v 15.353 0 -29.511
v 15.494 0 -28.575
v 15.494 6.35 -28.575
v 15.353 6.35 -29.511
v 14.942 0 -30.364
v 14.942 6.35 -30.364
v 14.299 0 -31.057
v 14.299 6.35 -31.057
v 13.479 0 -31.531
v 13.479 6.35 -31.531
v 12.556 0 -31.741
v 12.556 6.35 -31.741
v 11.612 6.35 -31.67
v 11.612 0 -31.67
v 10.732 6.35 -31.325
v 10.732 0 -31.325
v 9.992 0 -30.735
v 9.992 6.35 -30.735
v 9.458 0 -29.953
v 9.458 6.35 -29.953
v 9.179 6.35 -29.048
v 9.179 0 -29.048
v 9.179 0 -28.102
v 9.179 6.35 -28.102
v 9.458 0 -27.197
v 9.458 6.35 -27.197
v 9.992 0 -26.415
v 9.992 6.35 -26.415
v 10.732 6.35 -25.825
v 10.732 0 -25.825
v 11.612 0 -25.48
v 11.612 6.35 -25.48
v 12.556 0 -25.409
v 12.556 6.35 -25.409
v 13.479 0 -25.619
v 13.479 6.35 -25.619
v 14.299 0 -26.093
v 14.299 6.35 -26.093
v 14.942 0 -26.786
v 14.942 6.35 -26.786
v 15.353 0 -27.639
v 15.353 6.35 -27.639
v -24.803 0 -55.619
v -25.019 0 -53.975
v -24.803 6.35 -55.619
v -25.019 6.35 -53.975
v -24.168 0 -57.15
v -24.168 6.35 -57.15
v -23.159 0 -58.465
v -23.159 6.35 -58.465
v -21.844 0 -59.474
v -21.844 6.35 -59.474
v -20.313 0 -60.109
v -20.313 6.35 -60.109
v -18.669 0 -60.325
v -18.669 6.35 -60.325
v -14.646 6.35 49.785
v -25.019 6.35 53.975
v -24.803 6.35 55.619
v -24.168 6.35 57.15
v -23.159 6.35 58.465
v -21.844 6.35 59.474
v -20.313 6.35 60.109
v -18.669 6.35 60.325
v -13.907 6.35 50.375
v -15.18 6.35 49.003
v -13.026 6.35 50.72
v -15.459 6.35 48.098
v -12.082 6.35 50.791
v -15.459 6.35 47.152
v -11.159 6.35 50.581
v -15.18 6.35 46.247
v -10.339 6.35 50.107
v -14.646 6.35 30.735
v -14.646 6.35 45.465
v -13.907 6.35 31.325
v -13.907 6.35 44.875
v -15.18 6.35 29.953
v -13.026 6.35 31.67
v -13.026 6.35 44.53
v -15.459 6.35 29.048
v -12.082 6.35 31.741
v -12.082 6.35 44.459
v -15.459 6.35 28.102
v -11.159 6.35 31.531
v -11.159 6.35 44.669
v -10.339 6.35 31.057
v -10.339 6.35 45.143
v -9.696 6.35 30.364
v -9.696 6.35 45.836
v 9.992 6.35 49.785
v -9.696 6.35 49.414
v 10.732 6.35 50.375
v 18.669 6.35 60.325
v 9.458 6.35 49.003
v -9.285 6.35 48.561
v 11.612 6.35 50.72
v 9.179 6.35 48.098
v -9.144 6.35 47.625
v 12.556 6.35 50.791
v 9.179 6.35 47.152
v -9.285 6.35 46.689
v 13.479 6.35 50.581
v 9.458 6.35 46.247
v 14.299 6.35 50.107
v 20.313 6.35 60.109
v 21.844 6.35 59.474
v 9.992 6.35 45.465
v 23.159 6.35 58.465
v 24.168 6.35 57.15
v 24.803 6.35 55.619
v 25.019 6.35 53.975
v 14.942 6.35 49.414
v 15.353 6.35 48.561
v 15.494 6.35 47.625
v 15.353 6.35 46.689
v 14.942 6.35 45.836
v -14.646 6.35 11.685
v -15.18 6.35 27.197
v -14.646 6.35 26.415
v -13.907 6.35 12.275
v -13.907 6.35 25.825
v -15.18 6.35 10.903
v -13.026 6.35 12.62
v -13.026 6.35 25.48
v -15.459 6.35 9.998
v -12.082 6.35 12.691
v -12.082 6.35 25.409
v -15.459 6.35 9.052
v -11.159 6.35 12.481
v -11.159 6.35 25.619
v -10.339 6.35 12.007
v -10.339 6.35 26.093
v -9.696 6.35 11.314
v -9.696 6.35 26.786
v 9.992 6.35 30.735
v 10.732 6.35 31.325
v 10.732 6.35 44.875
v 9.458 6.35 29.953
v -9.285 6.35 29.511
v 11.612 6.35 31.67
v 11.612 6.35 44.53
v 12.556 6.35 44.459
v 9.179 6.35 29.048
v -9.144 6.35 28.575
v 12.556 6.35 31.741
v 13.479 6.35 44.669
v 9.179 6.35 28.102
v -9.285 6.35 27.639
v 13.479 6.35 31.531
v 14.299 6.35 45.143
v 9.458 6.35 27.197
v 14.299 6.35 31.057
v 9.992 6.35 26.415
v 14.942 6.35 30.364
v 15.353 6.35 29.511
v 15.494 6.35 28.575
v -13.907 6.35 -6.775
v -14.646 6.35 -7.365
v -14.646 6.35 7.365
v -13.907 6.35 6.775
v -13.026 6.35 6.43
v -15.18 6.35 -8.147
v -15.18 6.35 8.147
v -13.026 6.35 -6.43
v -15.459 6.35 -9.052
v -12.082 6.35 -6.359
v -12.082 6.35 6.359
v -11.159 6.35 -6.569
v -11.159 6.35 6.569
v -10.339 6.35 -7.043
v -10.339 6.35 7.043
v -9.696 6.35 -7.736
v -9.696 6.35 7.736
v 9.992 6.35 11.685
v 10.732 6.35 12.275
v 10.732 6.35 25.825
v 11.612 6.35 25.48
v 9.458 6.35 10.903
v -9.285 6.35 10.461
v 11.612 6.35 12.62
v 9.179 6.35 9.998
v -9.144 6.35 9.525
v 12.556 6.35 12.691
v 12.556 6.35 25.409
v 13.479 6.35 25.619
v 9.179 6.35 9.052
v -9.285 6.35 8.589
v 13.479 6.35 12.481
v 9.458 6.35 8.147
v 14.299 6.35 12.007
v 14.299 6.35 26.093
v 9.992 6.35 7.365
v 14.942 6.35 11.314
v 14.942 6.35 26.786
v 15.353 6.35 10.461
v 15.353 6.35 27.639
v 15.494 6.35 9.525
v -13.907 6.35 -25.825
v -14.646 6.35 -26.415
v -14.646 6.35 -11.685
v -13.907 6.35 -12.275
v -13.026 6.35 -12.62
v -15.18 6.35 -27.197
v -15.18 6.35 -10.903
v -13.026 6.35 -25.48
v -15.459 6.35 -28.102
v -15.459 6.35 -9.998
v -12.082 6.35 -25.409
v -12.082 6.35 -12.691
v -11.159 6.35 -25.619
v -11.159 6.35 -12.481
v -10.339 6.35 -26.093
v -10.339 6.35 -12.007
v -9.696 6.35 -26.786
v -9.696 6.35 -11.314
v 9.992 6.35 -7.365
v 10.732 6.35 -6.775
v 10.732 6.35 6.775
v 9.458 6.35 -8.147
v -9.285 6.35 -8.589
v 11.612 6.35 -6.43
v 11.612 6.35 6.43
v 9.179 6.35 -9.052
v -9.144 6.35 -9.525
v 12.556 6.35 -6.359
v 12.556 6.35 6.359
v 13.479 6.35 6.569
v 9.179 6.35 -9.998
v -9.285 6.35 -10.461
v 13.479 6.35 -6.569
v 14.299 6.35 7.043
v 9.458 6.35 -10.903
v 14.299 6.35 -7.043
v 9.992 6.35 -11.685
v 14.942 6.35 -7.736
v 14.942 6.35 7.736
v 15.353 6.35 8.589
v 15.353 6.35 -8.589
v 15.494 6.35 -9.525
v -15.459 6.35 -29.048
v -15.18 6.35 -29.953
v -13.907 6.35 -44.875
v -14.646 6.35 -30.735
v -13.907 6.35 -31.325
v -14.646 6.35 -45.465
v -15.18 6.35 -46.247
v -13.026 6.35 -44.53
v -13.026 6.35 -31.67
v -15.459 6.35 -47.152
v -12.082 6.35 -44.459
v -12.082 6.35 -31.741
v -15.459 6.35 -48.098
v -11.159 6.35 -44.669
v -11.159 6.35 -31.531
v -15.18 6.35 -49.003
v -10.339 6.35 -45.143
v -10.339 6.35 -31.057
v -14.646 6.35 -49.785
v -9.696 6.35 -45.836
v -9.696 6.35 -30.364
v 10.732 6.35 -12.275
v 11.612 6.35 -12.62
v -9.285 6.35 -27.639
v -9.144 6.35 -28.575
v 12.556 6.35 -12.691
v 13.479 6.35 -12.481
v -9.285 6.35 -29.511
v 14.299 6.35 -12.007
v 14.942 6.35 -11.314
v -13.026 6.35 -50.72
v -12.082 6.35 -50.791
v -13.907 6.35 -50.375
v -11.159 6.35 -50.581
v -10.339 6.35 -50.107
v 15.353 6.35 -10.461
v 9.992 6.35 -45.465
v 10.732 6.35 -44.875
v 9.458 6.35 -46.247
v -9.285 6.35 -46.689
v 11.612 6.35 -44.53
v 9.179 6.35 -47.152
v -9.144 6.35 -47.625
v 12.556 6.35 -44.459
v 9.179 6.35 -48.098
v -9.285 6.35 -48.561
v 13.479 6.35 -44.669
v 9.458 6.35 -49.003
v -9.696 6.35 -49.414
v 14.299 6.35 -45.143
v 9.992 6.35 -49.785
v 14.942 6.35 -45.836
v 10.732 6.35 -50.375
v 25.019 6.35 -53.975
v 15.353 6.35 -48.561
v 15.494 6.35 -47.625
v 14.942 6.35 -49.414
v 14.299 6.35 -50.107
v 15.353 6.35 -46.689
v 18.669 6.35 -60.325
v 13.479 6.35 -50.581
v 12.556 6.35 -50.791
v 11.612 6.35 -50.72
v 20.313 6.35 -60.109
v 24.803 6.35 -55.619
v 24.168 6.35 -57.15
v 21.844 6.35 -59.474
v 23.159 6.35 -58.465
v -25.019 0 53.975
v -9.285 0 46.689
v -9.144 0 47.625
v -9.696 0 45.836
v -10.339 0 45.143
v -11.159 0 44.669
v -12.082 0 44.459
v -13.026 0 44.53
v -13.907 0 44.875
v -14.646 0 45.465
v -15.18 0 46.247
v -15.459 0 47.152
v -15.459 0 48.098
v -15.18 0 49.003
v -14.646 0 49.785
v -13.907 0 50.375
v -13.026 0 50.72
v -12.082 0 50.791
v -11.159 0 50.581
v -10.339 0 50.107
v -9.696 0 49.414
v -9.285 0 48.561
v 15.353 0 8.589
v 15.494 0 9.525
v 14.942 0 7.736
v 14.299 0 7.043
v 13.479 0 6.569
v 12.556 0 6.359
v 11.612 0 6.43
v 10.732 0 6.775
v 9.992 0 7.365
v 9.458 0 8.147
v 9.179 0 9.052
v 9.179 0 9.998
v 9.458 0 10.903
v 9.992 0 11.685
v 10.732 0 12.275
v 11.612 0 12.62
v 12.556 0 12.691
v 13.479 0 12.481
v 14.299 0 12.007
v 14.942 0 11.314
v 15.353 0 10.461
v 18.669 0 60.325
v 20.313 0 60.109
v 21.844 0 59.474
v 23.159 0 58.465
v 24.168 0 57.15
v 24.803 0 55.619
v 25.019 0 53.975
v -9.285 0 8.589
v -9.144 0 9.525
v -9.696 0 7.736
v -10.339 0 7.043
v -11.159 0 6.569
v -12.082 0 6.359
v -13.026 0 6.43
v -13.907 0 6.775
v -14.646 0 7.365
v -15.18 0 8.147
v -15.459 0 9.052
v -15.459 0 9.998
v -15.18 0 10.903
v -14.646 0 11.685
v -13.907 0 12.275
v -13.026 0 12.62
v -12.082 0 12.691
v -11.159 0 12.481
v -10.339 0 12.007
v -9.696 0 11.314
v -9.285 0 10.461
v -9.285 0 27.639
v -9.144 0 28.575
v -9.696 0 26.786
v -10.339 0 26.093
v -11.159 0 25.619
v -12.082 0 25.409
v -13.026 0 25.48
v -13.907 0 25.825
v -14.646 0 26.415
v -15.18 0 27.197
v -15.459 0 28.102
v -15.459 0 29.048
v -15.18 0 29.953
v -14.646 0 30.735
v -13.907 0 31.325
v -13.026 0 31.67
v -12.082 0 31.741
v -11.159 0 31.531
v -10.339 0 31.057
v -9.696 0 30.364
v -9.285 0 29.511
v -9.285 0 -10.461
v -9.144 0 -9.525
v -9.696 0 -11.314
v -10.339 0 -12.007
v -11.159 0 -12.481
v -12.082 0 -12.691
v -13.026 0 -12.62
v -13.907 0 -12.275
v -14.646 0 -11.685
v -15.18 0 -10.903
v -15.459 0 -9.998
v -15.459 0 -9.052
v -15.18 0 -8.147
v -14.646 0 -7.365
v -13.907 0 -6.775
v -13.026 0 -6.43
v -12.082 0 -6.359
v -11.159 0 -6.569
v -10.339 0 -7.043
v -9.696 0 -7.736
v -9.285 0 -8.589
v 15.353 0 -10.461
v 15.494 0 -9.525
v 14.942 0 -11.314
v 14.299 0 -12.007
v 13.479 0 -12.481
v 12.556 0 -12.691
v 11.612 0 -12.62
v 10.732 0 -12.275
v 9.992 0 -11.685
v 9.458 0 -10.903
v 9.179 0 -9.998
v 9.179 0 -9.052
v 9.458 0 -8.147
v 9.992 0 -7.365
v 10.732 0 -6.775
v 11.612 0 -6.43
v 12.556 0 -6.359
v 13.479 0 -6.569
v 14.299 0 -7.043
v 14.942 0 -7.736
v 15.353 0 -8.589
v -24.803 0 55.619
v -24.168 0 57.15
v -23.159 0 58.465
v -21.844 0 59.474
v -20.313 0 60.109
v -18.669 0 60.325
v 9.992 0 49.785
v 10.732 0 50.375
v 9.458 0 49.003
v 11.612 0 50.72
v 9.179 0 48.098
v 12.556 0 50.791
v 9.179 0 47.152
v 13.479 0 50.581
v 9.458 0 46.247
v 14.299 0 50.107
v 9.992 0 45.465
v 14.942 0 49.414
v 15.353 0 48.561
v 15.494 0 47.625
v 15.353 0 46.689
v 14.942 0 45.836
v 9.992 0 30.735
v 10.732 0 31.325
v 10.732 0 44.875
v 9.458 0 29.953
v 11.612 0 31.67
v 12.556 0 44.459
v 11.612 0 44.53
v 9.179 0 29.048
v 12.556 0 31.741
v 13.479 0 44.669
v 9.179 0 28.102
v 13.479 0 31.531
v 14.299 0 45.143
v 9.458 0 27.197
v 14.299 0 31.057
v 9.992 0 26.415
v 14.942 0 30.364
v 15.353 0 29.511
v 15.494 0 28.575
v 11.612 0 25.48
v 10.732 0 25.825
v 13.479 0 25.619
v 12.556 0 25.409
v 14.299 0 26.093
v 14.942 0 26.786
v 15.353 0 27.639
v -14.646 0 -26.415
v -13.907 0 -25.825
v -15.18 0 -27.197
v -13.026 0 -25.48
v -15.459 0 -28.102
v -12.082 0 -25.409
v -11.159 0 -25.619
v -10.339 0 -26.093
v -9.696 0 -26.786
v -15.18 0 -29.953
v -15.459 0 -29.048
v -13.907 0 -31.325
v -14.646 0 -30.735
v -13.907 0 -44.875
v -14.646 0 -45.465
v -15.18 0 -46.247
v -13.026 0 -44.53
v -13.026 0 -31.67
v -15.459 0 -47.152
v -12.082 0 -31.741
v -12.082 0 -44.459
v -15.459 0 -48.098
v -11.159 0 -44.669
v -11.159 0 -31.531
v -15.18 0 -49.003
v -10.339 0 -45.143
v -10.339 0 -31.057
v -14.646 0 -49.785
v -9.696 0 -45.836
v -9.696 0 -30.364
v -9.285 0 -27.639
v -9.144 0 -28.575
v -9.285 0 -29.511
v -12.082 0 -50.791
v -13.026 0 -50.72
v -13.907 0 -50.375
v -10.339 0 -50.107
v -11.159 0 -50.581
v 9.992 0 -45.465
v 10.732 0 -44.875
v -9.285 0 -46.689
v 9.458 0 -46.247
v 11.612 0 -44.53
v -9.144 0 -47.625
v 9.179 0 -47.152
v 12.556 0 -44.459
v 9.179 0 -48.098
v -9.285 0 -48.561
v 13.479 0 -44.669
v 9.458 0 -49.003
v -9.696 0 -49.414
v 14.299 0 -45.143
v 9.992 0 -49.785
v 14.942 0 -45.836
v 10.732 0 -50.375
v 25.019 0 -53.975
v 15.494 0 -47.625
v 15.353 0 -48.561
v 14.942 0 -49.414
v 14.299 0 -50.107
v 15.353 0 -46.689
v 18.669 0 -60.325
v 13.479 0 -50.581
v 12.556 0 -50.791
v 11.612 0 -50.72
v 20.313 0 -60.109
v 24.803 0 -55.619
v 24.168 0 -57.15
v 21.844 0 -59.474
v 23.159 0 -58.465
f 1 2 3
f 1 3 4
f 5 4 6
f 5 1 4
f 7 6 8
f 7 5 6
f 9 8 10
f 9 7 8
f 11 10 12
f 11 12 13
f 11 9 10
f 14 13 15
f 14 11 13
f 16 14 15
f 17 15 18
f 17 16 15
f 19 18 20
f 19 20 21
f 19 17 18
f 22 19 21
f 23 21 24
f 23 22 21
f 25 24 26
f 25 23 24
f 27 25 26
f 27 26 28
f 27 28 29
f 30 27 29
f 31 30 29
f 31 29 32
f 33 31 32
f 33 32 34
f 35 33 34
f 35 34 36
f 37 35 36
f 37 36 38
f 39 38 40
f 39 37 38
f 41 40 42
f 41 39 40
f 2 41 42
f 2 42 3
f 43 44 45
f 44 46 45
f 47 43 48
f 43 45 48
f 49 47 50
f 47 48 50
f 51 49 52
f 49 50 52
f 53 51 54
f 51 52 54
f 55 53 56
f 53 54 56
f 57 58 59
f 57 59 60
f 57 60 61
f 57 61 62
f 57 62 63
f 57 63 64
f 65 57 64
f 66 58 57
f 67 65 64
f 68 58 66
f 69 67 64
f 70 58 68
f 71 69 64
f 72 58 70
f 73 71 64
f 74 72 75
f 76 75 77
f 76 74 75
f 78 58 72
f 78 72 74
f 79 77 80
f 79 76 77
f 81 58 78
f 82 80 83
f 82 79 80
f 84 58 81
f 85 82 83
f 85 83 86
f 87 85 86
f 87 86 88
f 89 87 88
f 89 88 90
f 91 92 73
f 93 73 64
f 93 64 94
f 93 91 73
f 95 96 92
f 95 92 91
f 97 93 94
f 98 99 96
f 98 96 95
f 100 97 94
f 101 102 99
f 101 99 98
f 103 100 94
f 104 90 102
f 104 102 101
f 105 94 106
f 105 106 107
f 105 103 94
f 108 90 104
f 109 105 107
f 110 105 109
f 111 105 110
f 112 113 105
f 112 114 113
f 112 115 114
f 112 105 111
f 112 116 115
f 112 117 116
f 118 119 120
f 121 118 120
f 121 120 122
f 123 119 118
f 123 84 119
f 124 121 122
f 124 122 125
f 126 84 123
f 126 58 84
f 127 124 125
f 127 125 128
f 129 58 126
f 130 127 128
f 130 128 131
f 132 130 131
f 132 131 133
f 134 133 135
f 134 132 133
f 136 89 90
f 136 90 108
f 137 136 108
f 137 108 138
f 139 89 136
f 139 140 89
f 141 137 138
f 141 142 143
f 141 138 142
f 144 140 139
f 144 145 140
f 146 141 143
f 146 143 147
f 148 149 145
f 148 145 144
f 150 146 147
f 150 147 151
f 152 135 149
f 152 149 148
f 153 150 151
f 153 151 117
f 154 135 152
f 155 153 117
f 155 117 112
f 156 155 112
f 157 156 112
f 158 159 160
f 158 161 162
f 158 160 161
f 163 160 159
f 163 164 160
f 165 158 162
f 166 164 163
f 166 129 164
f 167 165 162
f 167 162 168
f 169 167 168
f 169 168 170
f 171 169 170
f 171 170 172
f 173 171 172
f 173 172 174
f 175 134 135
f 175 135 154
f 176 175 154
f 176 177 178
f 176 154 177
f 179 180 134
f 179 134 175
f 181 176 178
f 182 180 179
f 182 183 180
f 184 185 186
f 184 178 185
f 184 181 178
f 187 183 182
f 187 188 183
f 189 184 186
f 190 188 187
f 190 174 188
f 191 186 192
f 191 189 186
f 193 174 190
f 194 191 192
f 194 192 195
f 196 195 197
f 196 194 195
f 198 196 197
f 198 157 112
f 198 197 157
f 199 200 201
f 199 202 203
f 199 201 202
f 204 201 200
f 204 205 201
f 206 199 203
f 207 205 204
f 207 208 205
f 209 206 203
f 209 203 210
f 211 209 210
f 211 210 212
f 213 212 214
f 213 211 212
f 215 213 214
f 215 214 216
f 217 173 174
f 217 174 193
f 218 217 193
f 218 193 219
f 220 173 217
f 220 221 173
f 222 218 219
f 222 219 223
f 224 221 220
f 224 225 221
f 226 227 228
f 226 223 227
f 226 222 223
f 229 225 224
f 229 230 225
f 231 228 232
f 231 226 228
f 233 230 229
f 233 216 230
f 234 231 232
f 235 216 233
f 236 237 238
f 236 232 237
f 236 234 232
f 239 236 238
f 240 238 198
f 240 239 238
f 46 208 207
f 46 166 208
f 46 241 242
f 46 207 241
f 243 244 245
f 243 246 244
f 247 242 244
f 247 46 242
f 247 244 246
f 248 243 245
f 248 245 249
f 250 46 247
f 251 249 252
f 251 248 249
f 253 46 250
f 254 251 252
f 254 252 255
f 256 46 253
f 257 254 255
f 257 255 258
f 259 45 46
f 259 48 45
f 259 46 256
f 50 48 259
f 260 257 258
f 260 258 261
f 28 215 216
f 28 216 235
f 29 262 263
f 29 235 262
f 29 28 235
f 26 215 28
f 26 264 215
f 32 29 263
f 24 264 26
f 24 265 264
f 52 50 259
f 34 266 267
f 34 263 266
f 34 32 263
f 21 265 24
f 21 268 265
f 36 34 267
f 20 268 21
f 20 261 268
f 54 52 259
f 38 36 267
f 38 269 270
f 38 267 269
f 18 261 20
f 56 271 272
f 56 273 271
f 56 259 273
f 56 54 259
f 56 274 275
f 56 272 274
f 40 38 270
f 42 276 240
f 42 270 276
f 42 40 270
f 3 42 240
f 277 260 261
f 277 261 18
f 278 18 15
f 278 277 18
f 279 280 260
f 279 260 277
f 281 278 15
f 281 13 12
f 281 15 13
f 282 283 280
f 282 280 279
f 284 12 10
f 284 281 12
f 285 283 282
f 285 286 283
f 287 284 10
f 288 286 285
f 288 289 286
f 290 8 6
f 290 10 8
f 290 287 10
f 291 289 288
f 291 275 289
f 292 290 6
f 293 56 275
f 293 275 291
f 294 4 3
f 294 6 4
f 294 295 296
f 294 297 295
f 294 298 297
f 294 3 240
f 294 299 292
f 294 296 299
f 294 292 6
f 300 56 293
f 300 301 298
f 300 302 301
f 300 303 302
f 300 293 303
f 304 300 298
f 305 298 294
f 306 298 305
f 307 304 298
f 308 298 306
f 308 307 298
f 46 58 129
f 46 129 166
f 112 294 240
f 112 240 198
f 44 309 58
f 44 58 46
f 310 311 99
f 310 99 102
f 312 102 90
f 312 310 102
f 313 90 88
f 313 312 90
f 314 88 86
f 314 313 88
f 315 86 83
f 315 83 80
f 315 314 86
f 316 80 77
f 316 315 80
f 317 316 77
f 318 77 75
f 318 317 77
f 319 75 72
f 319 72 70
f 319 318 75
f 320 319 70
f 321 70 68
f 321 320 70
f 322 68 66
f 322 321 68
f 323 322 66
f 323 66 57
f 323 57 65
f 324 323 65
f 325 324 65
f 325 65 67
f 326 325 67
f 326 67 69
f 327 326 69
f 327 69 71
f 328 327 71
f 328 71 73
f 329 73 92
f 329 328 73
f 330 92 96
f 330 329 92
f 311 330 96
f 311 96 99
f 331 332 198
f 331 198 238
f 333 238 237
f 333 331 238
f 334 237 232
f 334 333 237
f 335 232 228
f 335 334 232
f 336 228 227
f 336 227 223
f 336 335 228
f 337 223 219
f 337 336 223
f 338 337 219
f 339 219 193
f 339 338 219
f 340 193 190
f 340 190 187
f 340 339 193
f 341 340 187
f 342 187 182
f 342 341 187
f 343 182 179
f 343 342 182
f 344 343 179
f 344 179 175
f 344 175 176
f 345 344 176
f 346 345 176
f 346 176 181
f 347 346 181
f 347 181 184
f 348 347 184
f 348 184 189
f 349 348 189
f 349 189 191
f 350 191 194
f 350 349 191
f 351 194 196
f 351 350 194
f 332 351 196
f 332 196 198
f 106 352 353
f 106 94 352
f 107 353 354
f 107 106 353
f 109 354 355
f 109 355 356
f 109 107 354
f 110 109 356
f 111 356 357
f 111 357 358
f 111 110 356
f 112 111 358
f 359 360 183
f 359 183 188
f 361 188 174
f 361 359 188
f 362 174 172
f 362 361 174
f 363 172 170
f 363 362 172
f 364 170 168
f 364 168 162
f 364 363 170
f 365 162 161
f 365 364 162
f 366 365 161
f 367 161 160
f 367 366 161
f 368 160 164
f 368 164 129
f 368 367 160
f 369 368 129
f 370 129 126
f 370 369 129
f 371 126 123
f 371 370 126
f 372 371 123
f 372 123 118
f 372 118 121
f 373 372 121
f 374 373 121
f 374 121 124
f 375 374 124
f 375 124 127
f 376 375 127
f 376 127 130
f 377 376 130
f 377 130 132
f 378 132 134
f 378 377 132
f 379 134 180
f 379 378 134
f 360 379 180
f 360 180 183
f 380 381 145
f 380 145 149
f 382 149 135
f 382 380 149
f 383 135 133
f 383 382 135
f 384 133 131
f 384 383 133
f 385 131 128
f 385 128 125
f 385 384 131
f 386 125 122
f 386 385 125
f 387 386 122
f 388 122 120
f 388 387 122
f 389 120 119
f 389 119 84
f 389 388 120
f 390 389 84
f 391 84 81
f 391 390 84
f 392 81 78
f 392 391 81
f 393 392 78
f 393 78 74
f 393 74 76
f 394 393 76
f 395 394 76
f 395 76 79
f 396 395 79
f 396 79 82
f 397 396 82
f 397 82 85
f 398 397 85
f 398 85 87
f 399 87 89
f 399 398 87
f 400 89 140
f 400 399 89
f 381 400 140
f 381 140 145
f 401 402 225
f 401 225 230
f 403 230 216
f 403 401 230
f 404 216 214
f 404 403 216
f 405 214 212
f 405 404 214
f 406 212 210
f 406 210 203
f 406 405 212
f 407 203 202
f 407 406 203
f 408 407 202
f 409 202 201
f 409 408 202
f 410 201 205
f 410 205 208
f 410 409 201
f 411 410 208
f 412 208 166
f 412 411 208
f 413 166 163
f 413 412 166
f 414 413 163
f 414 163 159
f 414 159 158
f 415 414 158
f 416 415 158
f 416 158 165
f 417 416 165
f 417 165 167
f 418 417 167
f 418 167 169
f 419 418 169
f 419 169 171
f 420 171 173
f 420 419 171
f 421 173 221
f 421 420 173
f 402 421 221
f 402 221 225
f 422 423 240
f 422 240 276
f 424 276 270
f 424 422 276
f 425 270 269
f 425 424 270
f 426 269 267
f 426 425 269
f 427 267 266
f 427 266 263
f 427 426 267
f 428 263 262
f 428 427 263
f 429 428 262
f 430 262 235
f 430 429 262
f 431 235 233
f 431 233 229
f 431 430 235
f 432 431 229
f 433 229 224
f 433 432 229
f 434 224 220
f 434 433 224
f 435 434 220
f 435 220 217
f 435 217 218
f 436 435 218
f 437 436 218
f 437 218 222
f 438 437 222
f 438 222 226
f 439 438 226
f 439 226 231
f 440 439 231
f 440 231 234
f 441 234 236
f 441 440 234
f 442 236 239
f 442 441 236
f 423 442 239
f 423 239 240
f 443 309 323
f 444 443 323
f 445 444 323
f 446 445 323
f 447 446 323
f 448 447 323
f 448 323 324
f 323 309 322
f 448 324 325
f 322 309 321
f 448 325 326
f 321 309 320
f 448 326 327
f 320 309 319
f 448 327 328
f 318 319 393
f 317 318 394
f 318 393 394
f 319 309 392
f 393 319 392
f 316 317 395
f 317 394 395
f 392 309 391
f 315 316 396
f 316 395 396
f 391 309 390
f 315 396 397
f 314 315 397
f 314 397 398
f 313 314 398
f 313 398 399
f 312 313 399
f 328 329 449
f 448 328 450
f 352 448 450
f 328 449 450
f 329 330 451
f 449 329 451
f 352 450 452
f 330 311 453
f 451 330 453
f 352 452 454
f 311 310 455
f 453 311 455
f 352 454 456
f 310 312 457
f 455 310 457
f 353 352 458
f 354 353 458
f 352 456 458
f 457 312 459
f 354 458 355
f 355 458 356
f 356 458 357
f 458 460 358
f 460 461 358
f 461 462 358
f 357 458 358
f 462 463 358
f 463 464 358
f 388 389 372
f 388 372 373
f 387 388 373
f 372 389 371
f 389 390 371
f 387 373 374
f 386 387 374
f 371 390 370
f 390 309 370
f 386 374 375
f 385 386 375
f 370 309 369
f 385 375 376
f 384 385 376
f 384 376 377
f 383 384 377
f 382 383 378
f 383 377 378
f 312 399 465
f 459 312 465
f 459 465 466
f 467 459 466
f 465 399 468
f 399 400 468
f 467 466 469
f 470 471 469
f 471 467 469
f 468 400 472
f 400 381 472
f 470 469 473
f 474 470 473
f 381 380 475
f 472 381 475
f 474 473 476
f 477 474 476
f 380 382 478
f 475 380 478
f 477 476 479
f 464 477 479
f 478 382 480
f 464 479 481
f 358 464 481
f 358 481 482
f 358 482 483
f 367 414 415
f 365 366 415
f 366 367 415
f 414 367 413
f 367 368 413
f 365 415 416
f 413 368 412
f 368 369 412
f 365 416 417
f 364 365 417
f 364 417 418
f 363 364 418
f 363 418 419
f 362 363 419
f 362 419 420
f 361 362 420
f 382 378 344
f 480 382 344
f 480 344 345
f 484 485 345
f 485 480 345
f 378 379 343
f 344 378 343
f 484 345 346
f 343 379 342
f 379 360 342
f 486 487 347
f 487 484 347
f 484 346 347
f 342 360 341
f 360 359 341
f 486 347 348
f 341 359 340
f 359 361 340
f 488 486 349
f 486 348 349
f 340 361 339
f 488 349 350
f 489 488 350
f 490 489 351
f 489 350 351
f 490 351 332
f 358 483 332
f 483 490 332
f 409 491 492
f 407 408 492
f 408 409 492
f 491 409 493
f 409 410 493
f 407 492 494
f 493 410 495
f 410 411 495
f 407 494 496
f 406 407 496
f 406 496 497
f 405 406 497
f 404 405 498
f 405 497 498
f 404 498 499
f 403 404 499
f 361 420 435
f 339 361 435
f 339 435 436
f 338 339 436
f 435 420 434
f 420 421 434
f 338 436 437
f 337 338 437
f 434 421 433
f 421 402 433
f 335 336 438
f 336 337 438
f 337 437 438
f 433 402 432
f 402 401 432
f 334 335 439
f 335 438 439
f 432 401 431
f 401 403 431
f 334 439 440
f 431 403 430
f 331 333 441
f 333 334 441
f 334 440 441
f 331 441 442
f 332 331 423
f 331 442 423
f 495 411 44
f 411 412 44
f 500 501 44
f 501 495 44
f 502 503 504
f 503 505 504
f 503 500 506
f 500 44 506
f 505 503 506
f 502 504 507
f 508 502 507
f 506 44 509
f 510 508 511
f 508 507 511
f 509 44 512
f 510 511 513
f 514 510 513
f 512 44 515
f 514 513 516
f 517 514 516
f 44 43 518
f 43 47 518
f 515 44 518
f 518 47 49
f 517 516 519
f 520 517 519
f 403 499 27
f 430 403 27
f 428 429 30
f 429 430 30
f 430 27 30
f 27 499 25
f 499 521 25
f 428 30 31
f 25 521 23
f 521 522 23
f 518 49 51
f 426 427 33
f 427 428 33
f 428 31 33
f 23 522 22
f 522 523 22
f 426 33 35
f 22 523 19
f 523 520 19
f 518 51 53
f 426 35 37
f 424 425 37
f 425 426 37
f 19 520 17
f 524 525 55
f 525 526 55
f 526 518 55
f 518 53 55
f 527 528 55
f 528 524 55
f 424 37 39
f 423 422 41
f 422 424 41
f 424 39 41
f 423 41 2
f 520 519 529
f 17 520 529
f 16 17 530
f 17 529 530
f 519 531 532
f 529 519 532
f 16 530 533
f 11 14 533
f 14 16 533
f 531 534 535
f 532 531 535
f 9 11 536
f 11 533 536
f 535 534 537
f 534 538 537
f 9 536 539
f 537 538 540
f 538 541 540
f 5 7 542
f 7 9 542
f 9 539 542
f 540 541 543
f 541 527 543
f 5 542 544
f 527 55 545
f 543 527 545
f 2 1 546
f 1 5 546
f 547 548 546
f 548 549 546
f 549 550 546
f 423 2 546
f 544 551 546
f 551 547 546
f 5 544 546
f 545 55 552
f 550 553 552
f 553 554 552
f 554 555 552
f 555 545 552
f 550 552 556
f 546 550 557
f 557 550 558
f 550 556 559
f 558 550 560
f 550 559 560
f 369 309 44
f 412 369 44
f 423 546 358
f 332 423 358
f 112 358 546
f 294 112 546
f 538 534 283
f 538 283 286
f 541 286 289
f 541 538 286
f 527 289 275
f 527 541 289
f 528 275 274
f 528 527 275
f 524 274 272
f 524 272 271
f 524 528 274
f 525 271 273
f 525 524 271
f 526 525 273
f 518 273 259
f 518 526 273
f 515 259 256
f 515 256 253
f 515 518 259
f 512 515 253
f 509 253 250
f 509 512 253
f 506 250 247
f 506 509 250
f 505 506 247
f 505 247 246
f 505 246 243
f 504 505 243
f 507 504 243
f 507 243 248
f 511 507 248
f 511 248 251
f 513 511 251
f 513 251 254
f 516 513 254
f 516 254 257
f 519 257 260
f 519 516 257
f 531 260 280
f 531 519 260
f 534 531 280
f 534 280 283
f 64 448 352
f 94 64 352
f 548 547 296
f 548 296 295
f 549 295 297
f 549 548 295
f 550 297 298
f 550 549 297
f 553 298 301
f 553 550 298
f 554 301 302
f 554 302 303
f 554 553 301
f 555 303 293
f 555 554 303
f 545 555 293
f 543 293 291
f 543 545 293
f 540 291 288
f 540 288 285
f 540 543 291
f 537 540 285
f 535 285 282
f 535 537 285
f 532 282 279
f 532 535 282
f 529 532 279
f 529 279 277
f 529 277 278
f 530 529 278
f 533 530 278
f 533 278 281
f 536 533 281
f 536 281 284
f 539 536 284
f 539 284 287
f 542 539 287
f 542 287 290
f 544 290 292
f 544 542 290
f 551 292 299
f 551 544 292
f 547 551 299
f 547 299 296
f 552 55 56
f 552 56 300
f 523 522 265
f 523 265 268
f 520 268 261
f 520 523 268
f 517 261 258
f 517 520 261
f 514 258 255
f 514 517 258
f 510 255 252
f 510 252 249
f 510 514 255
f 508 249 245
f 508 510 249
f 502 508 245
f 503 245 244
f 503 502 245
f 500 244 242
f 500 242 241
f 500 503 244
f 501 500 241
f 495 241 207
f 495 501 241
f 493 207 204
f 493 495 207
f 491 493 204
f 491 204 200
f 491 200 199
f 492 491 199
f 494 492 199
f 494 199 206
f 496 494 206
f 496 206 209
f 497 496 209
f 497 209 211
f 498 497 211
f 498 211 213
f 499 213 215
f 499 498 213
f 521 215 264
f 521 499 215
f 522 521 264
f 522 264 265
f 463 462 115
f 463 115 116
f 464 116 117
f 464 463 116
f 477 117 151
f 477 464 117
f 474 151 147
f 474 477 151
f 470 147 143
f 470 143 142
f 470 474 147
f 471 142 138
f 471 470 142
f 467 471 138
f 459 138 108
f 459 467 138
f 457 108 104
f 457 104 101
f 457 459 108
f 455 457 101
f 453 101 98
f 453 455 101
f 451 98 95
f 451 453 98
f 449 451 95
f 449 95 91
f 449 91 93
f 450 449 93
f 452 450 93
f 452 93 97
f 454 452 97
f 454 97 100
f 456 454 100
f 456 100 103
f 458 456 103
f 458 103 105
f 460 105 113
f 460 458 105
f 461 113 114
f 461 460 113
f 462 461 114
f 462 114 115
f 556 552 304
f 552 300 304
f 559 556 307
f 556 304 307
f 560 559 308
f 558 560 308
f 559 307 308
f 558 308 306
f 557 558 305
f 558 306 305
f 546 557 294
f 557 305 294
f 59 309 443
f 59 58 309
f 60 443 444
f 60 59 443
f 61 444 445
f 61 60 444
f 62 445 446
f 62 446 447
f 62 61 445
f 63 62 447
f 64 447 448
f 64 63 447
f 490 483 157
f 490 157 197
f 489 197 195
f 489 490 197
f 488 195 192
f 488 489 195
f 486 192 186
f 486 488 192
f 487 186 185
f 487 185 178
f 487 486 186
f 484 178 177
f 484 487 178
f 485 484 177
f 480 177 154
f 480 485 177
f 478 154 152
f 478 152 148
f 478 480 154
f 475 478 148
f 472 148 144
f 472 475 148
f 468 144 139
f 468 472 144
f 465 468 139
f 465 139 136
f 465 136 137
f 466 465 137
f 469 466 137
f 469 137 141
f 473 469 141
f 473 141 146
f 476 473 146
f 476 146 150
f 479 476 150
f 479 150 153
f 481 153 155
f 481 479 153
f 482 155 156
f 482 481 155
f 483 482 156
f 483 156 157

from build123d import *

# Parameters (mm, degrees)
SKETCH1_W           = 50.038
SKETCH1_H           = 120.65
SKETCH1_R           = 3.175
BOSS_EXTRUDE1_DEPTH = 6.35
FILLET1_R           = 6.35


with BuildPart() as part:
    # Sketch1 → Boss-Extrude1 (new body)
    with BuildSketch(Plane(origin=(0, 0, 0), x_dir=(1, 0, 0), z_dir=(0, 1, 0))):
        Rectangle(SKETCH1_W, SKETCH1_H)
        with Locations((12.319, -47.625)):
            Circle(SKETCH1_R, mode=Mode.SUBTRACT)
        with Locations((-12.319, -47.625)):
            Circle(SKETCH1_R, mode=Mode.SUBTRACT)
        with Locations((12.319, -28.575)):
            Circle(SKETCH1_R, mode=Mode.SUBTRACT)
        with Locations((-12.319, -28.575)):
            Circle(SKETCH1_R, mode=Mode.SUBTRACT)
        with Locations((12.319, -9.525)):
            Circle(SKETCH1_R, mode=Mode.SUBTRACT)
        with Locations((-12.319, -9.525)):
            Circle(SKETCH1_R, mode=Mode.SUBTRACT)
        with Locations((12.319, 9.525)):
            Circle(SKETCH1_R, mode=Mode.SUBTRACT)
        with Locations((-12.319, 9.525)):
            Circle(SKETCH1_R, mode=Mode.SUBTRACT)
        with Locations((12.319, 28.575)):
            Circle(SKETCH1_R, mode=Mode.SUBTRACT)
        with Locations((-12.319, 28.575)):
            Circle(SKETCH1_R, mode=Mode.SUBTRACT)
        with Locations((12.319, 47.625)):
            Circle(SKETCH1_R, mode=Mode.SUBTRACT)
        with Locations((-12.319, 47.625)):
            Circle(SKETCH1_R, mode=Mode.SUBTRACT)
    extrude(amount=BOSS_EXTRUDE1_DEPTH)

    # Fillet1
    fillet1_edges = [part.edges().sort_by_distance(p)[0] for p in [
        (25.019, 3.175, 60.325),
        (-25.019, 3.175, 60.325),
        (-25.019, 3.175, -60.325),
        (25.019, 3.175, -60.325),
    ]]
    fillet(fillet1_edges, radius=FILLET1_R)


solid = part.part
